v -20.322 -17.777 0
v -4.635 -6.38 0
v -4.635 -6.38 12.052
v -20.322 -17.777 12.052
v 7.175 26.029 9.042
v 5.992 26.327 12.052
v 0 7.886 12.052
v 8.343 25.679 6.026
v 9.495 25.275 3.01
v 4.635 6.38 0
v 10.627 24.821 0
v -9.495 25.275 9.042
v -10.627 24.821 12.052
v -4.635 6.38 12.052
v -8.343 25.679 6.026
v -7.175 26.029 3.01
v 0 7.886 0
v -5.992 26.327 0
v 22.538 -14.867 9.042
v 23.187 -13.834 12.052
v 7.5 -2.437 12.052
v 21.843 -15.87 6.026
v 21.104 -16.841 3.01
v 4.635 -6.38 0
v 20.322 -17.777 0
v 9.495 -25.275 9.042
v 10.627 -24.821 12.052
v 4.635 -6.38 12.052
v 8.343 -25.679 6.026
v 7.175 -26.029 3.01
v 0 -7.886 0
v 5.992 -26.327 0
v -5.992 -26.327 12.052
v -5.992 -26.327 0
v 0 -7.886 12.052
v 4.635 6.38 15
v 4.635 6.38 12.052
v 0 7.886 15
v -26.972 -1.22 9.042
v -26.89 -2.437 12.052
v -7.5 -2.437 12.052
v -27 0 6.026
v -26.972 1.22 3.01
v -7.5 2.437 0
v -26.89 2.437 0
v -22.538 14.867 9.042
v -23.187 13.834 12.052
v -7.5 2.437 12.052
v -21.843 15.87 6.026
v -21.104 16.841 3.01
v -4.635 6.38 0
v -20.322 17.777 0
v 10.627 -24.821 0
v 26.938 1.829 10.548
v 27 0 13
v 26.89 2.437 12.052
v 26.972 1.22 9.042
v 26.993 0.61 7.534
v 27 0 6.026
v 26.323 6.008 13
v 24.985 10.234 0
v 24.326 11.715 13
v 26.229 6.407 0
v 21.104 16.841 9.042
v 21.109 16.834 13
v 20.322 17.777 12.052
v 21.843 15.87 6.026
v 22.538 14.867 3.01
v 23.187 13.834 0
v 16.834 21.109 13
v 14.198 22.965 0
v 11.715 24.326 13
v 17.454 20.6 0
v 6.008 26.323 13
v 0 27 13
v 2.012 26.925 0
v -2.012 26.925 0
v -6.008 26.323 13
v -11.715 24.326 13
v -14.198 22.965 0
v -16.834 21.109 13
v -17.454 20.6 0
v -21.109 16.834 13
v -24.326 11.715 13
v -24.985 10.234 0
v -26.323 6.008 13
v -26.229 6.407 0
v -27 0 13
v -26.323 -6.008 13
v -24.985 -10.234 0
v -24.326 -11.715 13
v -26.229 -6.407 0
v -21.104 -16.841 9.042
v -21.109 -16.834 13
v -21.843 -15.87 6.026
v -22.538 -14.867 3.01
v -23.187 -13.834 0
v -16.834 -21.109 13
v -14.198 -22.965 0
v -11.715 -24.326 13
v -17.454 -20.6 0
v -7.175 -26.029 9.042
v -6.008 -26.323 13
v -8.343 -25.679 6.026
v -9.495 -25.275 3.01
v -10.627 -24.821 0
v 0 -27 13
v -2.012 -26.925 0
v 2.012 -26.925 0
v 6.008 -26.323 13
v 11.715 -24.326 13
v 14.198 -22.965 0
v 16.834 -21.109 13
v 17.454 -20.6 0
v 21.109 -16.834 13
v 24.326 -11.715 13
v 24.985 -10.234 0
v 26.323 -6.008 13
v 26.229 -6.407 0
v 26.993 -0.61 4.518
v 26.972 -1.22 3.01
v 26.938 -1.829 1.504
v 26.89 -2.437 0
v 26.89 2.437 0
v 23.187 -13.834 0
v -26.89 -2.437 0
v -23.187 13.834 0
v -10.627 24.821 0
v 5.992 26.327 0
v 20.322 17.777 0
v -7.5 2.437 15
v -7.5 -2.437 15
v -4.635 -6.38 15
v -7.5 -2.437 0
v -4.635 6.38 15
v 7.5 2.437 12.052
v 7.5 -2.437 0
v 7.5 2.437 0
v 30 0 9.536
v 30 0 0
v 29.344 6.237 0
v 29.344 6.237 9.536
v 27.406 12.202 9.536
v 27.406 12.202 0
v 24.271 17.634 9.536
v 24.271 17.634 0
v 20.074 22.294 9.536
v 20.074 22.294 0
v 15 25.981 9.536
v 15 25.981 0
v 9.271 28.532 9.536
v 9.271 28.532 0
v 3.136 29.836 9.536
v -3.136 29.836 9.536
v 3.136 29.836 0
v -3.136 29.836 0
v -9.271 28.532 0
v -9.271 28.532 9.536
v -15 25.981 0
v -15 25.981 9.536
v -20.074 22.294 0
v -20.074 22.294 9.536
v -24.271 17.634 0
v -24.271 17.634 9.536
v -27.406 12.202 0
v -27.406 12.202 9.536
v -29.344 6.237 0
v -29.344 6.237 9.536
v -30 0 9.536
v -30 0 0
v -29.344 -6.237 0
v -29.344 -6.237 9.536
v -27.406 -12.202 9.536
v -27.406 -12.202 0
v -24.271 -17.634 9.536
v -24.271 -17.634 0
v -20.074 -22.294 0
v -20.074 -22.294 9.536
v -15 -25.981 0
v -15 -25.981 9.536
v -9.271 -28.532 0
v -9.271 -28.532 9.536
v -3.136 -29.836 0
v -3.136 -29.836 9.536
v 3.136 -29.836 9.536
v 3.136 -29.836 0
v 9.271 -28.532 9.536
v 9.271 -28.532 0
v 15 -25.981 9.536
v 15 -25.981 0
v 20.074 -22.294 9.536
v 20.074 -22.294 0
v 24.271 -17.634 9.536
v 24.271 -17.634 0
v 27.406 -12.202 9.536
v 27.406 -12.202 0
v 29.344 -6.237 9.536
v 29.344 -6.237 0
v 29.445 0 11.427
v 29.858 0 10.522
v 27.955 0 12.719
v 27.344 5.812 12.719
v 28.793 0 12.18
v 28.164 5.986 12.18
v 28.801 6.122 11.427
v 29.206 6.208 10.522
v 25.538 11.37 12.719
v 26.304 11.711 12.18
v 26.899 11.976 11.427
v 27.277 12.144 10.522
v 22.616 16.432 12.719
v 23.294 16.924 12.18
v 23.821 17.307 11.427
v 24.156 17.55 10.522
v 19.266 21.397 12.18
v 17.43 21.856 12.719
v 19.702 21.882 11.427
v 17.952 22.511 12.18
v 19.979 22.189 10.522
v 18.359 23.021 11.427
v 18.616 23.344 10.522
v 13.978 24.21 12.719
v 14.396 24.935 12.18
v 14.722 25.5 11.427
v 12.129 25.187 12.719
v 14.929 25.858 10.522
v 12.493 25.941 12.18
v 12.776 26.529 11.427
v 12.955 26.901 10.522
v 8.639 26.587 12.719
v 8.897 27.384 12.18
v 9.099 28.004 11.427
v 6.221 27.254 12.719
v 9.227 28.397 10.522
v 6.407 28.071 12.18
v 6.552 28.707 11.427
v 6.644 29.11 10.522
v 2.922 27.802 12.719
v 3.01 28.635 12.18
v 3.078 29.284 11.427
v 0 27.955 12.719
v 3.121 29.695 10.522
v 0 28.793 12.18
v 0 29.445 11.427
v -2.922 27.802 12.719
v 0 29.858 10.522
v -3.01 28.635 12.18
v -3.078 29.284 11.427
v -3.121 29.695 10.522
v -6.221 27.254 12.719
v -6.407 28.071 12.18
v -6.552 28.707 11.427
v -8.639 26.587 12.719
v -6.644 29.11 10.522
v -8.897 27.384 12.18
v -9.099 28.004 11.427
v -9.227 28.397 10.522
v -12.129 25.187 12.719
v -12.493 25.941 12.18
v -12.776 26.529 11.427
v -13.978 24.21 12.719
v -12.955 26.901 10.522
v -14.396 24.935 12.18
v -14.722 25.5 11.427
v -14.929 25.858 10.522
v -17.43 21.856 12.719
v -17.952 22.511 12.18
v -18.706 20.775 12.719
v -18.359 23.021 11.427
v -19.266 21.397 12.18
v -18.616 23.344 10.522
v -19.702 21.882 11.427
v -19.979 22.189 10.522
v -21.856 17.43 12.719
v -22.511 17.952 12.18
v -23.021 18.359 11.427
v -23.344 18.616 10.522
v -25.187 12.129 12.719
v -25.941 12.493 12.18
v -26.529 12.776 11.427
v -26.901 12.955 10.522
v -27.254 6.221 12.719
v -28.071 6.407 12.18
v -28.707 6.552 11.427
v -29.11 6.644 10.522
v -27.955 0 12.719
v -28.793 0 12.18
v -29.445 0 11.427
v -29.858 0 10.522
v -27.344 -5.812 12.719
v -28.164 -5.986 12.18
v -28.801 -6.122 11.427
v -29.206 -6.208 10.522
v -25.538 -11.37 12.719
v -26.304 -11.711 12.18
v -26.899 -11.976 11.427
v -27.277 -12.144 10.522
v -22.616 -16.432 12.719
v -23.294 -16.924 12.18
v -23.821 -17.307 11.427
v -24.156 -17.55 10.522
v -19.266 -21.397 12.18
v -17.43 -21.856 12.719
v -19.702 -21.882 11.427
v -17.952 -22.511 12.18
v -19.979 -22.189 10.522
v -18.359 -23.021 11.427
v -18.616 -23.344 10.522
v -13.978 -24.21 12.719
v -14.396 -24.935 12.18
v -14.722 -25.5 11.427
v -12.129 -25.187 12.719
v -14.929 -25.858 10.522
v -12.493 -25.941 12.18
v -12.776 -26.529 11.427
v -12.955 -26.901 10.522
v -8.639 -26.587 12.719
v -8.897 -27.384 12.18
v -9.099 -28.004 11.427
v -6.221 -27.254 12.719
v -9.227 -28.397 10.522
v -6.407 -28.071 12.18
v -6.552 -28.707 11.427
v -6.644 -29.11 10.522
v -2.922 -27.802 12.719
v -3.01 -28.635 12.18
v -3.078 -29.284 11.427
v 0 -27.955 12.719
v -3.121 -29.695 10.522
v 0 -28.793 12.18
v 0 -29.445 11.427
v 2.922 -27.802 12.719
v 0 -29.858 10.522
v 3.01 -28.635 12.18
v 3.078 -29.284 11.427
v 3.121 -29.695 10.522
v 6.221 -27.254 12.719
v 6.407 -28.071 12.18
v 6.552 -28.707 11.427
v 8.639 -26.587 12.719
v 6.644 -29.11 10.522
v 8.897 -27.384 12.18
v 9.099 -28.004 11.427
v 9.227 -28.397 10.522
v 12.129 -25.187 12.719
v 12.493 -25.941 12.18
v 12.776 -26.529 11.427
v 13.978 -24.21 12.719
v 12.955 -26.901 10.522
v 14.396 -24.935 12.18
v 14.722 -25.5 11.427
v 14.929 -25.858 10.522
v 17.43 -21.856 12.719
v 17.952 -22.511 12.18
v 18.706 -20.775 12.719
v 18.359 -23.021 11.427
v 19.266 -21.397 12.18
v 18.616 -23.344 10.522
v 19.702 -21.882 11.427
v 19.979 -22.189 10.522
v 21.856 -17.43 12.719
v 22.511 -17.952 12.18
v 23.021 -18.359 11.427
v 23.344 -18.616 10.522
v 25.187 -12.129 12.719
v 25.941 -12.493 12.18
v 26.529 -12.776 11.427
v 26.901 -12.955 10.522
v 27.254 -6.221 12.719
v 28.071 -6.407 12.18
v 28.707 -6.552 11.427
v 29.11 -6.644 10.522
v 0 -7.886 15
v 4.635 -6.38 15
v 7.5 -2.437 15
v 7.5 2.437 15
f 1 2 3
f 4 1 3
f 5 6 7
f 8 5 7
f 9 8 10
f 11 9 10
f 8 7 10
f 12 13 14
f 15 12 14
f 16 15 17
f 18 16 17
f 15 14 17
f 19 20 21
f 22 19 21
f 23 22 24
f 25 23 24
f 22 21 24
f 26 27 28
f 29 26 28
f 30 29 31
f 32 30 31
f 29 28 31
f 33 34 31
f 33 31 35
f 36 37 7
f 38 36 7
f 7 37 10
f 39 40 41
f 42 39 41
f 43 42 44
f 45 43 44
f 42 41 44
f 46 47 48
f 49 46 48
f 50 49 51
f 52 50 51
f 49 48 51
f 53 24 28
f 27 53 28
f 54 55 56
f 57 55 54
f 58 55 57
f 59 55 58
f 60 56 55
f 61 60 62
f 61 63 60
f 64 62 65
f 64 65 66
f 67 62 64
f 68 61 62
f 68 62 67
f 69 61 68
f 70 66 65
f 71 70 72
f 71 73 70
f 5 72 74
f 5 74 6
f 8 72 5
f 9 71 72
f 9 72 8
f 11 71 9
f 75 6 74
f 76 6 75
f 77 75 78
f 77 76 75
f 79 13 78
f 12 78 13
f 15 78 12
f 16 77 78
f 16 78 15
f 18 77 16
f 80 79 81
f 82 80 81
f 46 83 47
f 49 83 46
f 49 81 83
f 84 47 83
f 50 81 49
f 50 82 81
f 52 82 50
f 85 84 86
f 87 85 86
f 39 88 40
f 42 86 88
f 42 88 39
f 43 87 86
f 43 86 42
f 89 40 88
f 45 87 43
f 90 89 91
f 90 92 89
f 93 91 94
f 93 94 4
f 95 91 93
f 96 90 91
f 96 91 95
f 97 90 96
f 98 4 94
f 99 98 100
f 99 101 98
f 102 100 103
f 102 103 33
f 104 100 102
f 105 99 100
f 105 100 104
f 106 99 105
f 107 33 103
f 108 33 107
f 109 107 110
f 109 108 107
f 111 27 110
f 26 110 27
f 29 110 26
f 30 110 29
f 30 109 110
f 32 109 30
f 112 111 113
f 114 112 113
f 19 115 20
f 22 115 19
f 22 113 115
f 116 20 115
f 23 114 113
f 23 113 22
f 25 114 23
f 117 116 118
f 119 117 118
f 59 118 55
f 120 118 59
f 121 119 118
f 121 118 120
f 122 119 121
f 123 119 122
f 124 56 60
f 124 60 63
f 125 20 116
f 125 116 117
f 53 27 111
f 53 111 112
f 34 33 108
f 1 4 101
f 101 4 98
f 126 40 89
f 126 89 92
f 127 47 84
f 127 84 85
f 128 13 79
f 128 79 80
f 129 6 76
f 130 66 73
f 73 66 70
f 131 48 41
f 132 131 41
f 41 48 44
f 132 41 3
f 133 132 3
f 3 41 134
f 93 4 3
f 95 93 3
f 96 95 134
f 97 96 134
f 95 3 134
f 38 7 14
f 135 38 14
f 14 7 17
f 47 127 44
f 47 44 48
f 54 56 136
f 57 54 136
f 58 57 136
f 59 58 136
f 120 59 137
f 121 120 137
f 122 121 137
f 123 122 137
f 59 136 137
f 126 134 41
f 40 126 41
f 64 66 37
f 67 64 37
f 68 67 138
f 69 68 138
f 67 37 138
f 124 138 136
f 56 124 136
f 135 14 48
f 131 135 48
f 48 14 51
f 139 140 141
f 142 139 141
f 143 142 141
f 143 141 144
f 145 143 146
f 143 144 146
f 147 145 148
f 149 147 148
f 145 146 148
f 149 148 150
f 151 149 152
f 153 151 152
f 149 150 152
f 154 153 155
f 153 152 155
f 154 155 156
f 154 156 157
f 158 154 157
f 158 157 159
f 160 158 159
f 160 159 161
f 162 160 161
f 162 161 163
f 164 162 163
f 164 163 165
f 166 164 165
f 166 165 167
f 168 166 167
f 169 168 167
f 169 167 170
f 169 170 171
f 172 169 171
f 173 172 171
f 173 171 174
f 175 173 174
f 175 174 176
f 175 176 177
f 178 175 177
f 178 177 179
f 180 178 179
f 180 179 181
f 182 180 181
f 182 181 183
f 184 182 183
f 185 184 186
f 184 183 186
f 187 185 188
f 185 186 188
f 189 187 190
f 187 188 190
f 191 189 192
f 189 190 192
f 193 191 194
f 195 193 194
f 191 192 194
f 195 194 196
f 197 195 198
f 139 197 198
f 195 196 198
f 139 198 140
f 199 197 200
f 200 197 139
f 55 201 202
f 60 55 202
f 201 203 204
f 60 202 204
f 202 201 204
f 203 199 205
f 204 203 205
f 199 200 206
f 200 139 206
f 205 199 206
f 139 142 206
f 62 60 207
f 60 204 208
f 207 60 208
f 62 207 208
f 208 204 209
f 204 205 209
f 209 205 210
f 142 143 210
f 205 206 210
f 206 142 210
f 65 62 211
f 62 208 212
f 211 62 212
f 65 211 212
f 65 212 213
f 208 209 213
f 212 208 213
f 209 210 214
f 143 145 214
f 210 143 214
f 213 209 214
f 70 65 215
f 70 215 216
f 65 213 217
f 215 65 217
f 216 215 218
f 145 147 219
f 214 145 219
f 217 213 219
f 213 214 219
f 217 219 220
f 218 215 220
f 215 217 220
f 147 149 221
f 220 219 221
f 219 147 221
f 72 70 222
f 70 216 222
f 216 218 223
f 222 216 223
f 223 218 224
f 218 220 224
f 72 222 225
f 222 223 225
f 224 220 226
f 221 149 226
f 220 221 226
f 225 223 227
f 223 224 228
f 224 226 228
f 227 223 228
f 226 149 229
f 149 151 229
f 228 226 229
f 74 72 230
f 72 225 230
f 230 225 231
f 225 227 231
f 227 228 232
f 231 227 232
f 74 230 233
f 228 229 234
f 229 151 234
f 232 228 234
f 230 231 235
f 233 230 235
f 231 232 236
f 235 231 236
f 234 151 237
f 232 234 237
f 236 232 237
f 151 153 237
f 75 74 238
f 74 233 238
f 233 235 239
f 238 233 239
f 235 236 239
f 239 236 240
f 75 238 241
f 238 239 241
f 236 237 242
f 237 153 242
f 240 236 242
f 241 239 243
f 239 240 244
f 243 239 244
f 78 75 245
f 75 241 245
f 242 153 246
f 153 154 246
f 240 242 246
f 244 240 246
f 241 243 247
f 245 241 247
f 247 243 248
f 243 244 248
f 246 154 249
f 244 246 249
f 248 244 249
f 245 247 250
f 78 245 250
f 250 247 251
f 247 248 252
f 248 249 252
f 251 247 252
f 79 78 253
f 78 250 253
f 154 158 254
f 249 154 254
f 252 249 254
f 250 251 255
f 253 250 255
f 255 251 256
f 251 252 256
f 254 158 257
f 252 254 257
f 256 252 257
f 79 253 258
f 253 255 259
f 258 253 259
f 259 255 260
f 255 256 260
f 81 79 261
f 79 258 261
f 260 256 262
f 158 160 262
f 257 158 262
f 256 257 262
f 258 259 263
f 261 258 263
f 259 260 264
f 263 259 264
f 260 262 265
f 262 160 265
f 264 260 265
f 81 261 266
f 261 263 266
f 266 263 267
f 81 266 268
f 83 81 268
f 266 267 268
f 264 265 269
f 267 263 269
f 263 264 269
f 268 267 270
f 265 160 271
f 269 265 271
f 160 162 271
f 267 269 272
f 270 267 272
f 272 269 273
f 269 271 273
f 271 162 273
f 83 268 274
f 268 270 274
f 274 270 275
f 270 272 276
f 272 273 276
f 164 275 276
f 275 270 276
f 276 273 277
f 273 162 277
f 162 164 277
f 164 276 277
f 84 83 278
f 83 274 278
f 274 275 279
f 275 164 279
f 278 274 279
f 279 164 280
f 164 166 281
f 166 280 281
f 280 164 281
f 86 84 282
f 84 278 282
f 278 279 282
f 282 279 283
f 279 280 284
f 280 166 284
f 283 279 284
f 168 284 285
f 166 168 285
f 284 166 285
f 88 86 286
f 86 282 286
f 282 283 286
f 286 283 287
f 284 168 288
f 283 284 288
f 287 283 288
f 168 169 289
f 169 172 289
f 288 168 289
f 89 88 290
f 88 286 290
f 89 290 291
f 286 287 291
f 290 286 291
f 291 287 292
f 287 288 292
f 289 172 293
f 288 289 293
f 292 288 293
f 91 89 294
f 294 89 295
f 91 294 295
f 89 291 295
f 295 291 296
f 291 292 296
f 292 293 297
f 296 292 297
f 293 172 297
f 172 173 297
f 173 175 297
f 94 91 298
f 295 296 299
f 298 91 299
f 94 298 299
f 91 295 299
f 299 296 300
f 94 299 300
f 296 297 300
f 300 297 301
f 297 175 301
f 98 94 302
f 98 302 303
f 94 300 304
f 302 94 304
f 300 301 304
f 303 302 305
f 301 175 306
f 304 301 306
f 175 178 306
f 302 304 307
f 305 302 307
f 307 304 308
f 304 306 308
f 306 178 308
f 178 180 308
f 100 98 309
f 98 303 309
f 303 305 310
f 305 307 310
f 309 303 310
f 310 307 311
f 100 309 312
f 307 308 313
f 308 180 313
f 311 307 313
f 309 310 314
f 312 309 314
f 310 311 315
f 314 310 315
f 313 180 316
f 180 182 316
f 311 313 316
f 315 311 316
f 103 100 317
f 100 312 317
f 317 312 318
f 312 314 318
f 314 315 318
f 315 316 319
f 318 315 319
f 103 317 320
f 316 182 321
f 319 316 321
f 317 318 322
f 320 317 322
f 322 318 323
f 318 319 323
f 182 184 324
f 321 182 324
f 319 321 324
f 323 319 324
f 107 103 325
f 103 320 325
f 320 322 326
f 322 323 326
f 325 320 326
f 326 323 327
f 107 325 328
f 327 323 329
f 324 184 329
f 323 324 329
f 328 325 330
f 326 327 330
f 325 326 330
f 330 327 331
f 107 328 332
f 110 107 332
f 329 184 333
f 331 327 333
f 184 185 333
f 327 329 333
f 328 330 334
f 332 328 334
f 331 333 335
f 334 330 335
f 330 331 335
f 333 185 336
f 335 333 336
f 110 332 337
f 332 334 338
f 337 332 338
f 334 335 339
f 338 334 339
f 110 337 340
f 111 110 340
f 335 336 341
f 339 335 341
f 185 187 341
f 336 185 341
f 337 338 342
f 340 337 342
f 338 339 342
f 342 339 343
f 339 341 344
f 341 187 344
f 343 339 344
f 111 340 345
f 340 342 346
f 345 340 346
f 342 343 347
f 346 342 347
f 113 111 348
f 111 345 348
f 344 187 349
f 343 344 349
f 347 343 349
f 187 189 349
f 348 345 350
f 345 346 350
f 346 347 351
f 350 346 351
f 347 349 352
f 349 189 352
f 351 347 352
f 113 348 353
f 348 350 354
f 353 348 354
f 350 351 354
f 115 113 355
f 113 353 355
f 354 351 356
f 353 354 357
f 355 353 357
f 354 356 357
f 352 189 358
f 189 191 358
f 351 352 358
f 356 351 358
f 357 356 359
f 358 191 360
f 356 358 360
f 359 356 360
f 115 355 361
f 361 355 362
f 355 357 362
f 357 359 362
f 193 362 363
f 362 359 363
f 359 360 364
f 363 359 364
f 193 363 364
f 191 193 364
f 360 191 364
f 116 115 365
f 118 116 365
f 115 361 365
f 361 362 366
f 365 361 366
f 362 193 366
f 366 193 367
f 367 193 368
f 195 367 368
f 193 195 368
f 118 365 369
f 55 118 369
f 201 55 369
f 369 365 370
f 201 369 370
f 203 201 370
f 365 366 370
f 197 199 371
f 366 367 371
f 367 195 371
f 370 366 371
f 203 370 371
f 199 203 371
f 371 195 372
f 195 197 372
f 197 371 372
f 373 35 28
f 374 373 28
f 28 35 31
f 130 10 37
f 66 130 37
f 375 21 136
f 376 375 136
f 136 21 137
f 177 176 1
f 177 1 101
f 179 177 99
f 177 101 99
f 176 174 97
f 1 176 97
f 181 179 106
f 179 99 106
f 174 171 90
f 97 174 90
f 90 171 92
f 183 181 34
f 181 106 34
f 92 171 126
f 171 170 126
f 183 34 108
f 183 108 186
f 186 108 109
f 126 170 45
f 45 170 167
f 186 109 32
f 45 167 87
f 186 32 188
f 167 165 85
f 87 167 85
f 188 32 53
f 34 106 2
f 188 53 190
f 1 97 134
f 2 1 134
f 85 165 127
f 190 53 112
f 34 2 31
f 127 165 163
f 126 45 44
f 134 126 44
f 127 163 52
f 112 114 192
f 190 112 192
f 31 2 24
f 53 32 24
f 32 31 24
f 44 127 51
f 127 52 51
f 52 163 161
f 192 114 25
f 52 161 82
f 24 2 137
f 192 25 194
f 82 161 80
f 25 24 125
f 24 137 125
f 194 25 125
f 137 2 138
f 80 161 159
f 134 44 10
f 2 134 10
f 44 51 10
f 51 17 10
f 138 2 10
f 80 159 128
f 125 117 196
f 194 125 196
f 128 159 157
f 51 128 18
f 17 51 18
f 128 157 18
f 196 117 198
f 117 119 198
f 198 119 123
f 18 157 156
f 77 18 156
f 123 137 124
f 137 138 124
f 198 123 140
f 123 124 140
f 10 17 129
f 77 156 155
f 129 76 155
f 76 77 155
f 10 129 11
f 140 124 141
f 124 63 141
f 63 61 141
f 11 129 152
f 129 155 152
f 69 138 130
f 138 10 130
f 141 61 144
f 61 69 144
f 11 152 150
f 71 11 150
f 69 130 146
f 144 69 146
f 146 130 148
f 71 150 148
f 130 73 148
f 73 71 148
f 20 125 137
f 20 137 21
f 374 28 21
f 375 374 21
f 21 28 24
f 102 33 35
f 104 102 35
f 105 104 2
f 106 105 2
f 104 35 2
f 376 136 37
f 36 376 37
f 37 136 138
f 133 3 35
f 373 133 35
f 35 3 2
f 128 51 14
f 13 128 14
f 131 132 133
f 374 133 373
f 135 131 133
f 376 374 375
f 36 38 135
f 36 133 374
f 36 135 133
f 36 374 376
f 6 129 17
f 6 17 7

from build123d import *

# Parameters (mm, degrees)
F1_DEPTH  = 15
F3_DEPTH  = 20
F5_DEPTH  = 20
F14_DEPTH = 20
F15_DEPTH = 20
F16_DEPTH = 20
F17_DEPTH = 20
F18_DEPTH = 20
F19_DEPTH = 20
F20_DEPTH = 20
F21_DEPTH = 20
F23_R     = 30
F23_R_2   = 27
F24_DEPTH = 13
F26_R     = 1
F27_DEPTH = 8


# Not quite as in the source:
# - a fillet or chamfer that OpenCascade refuses, or shapes differently, is made with other operations: its cross-section is extruded or revolved along the edge and cut away or added


with BuildPart() as f1:
    # F0 (on Top) → F1 (new body)
    with BuildSketch(Plane.XY):
        Polygon((7.5, -2.4368977217), (7.5, 2.4368977217), (4.6352549156, 6.3798810626), (0, 7.8859666818), (-4.6352549156, 6.3798810626), (-7.5, 2.4368977217), (-7.5, -2.4368977217), (-4.6352549156, -6.3798810626), (0, -7.8859666818), (4.6352549156, -6.3798810626), align=None)
    extrude(amount=F1_DEPTH)

    # F2 (on face) → F3 (join)
    with BuildSketch(Plane(origin=(-2.3176274578, -7.1329238722, 0), x_dir=(0.9510565163, -0.3090169944, 0), z_dir=(-0.3090169944, -0.9510565163, 0))):
        Polygon((2.4368977217, 12.0518097386), (-2.4368977217, 0), (2.4368977217, 0), align=None)
    extrude(amount=F3_DEPTH)

    # F4 (on face) → F5 (join)
    with BuildSketch(Plane(origin=(-6.0676274578, -4.4083893922, 0), x_dir=(0.5877852523, -0.8090169944, 0), z_dir=(-0.8090169944, -0.5877852523, 0))):
        Polygon((2.4368977217, 12.0518097386), (-2.4368977217, 0), (2.4368977217, 0), align=None)
    extrude(amount=F5_DEPTH)

    # F13 (on face) → F14 (join)
    with BuildSketch(Plane(origin=(2.3176274578, -7.1329238722, 0), x_dir=(0.9510565163, 0.3090169944, 0), z_dir=(0.3090169944, -0.9510565163, 0))):
        Polygon((2.4368977217, 12.0518097386), (-2.4368977217, 0), (2.4368977217, 0), align=None)
    extrude(amount=F14_DEPTH)

    # F12 (on face) → F15 (join)
    with BuildSketch(Plane(origin=(6.0676274578, -4.4083893922, 0), x_dir=(0.5877852523, 0.8090169944, 0), z_dir=(0.8090169944, -0.5877852523, 0))):
        Polygon((2.4368977217, 12.0518097386), (-2.4368977217, 0), (2.4368977217, 0), align=None)
    extrude(amount=F15_DEPTH)

    # F11 (on face) → F16 (join)
    with BuildSketch(Plane.YZ.offset(7.5)):
        Polygon((2.4368977217, 12.0518097386), (-2.4368977217, 0), (2.4368977217, 0), align=None)
    extrude(amount=F16_DEPTH)

    # F10 (on face) → F17 (join)
    with BuildSketch(Plane(origin=(6.0676274578, 4.4083893922, 0), x_dir=(-0.5877852523, 0.8090169944, 0), z_dir=(0.8090169944, 0.5877852523, 0))):
        Polygon((2.4368977217, 12.0518097386), (-2.4368977217, 0), (2.4368977217, 0), align=None)
    extrude(amount=F17_DEPTH)

    # F9 (on face) → F18 (join)
    with BuildSketch(Plane(origin=(2.3176274578, 7.1329238722, 0), x_dir=(-0.9510565163, 0.3090169944, 0), z_dir=(0.3090169944, 0.9510565163, 0))):
        Polygon((2.4368977217, 12.0518097386), (-2.4368977217, 0), (2.4368977217, 0), align=None)
    extrude(amount=F18_DEPTH)

    # F8 (on face) → F19 (join)
    with BuildSketch(Plane(origin=(-2.3176274578, 7.1329238722, 0), x_dir=(-0.9510565163, -0.3090169944, 0), z_dir=(-0.3090169944, 0.9510565163, 0))):
        Polygon((2.4368977217, 12.0518097386), (-2.4368977217, 0), (2.4368977217, 0), align=None)
    extrude(amount=F19_DEPTH)

    # F7 (on face) → F20 (join)
    with BuildSketch(Plane(origin=(-6.0676274578, 4.4083893922, 0), x_dir=(-0.5877852523, -0.8090169944, 0), z_dir=(-0.8090169944, 0.5877852523, 0))):
        Polygon((2.4368977217, 12.0518097386), (-2.4368977217, 0), (2.4368977217, 0), align=None)
    extrude(amount=F20_DEPTH)

    # F6 (on face) → F21 (join)
    with BuildSketch(Plane(origin=(-7.5, 0, 0), x_dir=(0, -1, 0), z_dir=(-1, 0, 0))):
        Polygon((2.4368977217, 12.0518097386), (-2.4368977217, 0), (2.4368977217, 0), align=None)
    extrude(amount=F21_DEPTH)

    # F23 (on face) → F24 (join)
    with BuildSketch(Plane.XY):
        Circle(F23_R)
        Circle(F23_R_2, mode=Mode.SUBTRACT)
    extrude(amount=F24_DEPTH)

    # F25: fillet of radius 3.5 on 1 edges, made by hand

    # F25_s1 → F25_t2 (revolve, cut)
    with BuildSketch(Plane.XZ):
        with BuildLine():
            ThreePointArc((27, 13), (29.1457513111, 11.8271862323), (30, 9.5358983849))
            Line((30, 9.5358983849), (30, 13))
            Line((30, 13), (27, 13))
        make_face()
    revolve(axis=Axis((0, 0, 13), (0, 0, 1)), mode=Mode.SUBTRACT)

    # F26 (on face) → F27 (join)
    with BuildSketch(Plane.XY):
        Circle(F26_R)
    extrude(amount=F27_DEPTH)


solid = f1.part
